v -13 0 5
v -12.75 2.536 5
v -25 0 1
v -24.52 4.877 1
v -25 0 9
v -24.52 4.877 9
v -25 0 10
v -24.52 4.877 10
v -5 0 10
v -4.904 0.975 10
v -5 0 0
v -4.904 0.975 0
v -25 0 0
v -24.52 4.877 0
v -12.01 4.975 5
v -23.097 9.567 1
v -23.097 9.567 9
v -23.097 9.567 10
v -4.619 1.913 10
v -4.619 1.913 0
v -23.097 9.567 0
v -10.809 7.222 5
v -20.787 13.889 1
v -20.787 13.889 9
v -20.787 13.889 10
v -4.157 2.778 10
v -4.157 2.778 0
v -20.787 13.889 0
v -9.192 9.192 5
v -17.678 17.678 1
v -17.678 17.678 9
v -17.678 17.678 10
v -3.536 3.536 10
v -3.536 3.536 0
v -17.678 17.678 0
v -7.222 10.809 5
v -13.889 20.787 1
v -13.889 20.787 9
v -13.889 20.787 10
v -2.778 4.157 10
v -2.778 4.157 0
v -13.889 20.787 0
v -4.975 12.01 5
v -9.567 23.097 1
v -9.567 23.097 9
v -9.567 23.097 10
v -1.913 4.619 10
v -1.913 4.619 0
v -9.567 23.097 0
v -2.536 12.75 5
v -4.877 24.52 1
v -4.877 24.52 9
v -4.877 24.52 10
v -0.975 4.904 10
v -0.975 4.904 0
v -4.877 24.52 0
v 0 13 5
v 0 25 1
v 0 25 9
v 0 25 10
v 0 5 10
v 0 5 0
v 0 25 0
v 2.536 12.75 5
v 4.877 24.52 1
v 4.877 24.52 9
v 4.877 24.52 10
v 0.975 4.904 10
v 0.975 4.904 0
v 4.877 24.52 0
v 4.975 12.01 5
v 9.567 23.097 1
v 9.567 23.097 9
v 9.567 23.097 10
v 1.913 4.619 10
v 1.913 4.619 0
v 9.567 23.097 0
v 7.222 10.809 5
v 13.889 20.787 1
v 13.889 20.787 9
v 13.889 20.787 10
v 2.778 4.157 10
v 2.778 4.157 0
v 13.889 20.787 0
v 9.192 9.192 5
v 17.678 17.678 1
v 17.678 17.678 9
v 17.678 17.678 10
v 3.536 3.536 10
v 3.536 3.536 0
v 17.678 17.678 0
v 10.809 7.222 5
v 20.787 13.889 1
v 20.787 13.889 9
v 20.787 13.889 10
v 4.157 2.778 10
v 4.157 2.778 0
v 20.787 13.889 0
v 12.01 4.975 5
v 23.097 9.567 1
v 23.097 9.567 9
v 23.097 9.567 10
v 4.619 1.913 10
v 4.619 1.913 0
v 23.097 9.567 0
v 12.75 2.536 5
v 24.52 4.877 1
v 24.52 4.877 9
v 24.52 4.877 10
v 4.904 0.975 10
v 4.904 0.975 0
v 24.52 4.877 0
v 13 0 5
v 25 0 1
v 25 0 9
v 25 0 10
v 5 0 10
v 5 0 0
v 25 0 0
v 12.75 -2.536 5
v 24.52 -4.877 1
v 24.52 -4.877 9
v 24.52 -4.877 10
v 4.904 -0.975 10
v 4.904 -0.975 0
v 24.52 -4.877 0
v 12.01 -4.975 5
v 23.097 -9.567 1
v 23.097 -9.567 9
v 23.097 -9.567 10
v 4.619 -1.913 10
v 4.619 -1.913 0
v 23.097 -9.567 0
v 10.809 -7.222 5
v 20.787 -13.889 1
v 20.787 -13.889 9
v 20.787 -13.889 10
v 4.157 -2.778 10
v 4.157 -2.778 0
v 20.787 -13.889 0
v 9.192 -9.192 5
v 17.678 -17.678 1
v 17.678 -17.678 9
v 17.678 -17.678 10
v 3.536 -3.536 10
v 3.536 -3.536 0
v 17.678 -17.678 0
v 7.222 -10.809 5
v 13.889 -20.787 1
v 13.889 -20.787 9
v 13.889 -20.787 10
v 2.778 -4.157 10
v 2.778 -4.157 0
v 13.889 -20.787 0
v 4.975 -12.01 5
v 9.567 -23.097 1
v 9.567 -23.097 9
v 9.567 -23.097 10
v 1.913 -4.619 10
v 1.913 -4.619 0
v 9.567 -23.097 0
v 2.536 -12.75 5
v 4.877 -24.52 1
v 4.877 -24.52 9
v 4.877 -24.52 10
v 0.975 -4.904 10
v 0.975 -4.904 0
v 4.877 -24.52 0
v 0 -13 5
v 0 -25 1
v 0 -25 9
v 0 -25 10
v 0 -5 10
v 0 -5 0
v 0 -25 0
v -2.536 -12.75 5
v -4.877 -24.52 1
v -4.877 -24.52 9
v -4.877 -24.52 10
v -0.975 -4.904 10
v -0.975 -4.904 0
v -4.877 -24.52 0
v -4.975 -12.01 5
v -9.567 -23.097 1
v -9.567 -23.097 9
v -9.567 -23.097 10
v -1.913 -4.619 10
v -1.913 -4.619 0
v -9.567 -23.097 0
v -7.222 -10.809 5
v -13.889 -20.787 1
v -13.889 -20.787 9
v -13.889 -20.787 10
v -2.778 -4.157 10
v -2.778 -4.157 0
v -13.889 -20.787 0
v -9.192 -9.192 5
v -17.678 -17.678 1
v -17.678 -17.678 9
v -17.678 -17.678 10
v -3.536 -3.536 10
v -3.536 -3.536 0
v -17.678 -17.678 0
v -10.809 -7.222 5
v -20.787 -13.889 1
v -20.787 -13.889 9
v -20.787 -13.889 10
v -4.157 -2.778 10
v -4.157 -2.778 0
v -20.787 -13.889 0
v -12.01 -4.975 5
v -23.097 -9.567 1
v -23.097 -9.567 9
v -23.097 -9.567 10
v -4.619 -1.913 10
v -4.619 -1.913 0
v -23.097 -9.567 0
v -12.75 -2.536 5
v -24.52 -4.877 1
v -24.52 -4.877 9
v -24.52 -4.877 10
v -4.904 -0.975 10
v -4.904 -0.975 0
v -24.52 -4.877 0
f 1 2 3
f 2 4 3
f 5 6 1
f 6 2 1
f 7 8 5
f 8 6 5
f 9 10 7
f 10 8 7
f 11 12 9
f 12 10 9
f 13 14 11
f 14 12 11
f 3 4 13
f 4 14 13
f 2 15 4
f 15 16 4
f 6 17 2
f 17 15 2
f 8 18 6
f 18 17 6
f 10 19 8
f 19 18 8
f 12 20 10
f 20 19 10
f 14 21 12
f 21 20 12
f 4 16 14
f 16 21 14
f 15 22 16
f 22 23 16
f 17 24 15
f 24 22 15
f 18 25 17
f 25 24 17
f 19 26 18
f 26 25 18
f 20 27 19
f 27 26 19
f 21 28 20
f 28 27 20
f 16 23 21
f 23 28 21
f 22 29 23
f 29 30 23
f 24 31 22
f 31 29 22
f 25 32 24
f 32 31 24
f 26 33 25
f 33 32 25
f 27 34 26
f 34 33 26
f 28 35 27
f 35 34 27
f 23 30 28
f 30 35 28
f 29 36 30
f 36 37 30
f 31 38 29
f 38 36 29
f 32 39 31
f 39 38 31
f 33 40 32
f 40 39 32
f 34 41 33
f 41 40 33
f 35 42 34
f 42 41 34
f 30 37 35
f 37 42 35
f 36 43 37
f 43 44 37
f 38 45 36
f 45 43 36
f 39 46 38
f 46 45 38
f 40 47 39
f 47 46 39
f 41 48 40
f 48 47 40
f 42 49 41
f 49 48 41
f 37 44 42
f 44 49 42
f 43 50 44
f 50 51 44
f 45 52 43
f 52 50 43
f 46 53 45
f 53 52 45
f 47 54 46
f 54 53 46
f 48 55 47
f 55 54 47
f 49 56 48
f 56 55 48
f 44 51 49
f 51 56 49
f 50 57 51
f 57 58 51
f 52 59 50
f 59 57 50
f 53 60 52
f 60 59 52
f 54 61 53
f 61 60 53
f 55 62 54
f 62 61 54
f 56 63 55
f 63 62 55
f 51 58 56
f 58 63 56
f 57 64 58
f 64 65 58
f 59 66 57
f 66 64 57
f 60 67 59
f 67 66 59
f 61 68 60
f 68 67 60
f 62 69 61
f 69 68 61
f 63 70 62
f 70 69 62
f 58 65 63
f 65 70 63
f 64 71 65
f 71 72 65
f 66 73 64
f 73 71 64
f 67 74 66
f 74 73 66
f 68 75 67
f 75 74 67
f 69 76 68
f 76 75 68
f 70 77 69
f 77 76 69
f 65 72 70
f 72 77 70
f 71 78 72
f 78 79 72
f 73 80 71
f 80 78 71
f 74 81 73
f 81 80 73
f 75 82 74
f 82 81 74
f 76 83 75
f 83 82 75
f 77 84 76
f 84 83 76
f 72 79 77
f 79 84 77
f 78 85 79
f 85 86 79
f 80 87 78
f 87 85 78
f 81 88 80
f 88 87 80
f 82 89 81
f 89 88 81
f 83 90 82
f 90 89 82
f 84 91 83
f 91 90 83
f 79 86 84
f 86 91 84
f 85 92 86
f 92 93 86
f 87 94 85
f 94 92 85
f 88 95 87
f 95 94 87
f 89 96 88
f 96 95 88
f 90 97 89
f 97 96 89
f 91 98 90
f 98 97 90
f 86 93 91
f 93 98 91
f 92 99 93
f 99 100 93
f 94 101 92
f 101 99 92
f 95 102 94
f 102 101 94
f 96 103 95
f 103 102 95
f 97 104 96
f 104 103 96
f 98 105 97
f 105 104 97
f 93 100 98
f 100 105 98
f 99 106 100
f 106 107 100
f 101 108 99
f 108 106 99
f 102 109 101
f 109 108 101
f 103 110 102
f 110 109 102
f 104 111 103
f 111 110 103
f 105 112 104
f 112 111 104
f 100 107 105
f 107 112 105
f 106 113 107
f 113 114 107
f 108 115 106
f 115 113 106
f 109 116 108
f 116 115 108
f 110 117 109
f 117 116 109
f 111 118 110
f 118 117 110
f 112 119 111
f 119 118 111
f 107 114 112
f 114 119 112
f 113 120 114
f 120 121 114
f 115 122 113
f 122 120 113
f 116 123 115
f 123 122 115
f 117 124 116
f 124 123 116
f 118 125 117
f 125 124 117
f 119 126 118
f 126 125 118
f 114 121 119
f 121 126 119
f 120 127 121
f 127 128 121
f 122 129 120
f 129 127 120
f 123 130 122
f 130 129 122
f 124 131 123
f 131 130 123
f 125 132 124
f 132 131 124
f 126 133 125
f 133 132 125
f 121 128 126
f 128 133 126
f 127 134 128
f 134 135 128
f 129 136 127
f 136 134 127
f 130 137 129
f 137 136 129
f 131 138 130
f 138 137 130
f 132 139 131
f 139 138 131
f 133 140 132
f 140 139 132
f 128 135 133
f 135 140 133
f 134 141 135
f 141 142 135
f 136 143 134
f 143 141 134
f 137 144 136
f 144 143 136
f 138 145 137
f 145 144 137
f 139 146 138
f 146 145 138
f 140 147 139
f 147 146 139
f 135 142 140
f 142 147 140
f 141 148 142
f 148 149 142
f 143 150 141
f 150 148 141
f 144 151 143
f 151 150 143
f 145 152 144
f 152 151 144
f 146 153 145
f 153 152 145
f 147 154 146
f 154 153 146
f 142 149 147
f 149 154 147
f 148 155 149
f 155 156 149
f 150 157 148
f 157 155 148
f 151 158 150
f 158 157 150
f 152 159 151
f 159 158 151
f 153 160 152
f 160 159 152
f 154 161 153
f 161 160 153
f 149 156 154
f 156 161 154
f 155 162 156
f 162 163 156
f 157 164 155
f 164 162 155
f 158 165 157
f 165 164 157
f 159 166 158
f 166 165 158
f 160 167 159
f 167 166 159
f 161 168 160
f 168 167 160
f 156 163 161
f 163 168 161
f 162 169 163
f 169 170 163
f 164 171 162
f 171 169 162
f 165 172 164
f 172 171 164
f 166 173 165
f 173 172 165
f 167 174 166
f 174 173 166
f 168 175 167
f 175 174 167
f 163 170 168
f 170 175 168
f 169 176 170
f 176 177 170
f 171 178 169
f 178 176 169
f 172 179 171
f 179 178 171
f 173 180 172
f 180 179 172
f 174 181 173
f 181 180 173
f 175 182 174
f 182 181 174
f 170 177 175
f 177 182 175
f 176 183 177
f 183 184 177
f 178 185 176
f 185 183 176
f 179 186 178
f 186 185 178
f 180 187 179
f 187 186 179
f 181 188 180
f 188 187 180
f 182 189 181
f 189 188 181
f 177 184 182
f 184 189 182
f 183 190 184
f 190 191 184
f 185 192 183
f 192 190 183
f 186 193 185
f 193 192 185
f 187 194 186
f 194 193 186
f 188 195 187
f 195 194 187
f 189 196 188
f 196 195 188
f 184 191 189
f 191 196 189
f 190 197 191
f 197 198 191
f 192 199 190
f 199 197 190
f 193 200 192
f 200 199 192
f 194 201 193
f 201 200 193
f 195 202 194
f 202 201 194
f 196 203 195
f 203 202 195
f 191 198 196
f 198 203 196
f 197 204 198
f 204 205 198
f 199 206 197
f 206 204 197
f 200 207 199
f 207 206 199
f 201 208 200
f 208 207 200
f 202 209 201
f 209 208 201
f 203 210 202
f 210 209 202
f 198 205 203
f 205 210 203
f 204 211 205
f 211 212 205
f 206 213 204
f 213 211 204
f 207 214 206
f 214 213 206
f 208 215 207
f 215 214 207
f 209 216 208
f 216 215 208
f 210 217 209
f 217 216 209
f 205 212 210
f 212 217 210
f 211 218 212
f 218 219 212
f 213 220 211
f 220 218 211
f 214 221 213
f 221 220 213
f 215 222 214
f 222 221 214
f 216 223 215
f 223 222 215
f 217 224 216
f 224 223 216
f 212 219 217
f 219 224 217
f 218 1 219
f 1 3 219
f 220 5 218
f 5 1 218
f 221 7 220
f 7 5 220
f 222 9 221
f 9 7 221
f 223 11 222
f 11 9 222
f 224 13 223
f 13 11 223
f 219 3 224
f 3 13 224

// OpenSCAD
$fn = 32;

// ----------------------------------------------------------------------
// Revolved part: V-groove pulley R25
// ----------------------------------------------------------------------

// --- parameters (mm) ---
bore_r = 5;               // bore radius
rim_r = 25;               // rim radius
rim_t = 10;               // rim width
groove_r = 13;            // groove root radius
groove_w = 4;             // groove half width
revolve_angle = 360;      // revolve sweep, degrees

bore_d = 2 * bore_r;
rim_d = 2 * rim_r;
groove_d = 2 * groove_r;

profile = [[5, 0], [25, 0], [25, 1], [13, 5], [25, 9], [25, 10], [5, 10]];  // primary outline, 7 points, counter clockwise

// --- the one profile operation ---
rotate_extrude(angle = revolve_angle) polygon(points = profile);
